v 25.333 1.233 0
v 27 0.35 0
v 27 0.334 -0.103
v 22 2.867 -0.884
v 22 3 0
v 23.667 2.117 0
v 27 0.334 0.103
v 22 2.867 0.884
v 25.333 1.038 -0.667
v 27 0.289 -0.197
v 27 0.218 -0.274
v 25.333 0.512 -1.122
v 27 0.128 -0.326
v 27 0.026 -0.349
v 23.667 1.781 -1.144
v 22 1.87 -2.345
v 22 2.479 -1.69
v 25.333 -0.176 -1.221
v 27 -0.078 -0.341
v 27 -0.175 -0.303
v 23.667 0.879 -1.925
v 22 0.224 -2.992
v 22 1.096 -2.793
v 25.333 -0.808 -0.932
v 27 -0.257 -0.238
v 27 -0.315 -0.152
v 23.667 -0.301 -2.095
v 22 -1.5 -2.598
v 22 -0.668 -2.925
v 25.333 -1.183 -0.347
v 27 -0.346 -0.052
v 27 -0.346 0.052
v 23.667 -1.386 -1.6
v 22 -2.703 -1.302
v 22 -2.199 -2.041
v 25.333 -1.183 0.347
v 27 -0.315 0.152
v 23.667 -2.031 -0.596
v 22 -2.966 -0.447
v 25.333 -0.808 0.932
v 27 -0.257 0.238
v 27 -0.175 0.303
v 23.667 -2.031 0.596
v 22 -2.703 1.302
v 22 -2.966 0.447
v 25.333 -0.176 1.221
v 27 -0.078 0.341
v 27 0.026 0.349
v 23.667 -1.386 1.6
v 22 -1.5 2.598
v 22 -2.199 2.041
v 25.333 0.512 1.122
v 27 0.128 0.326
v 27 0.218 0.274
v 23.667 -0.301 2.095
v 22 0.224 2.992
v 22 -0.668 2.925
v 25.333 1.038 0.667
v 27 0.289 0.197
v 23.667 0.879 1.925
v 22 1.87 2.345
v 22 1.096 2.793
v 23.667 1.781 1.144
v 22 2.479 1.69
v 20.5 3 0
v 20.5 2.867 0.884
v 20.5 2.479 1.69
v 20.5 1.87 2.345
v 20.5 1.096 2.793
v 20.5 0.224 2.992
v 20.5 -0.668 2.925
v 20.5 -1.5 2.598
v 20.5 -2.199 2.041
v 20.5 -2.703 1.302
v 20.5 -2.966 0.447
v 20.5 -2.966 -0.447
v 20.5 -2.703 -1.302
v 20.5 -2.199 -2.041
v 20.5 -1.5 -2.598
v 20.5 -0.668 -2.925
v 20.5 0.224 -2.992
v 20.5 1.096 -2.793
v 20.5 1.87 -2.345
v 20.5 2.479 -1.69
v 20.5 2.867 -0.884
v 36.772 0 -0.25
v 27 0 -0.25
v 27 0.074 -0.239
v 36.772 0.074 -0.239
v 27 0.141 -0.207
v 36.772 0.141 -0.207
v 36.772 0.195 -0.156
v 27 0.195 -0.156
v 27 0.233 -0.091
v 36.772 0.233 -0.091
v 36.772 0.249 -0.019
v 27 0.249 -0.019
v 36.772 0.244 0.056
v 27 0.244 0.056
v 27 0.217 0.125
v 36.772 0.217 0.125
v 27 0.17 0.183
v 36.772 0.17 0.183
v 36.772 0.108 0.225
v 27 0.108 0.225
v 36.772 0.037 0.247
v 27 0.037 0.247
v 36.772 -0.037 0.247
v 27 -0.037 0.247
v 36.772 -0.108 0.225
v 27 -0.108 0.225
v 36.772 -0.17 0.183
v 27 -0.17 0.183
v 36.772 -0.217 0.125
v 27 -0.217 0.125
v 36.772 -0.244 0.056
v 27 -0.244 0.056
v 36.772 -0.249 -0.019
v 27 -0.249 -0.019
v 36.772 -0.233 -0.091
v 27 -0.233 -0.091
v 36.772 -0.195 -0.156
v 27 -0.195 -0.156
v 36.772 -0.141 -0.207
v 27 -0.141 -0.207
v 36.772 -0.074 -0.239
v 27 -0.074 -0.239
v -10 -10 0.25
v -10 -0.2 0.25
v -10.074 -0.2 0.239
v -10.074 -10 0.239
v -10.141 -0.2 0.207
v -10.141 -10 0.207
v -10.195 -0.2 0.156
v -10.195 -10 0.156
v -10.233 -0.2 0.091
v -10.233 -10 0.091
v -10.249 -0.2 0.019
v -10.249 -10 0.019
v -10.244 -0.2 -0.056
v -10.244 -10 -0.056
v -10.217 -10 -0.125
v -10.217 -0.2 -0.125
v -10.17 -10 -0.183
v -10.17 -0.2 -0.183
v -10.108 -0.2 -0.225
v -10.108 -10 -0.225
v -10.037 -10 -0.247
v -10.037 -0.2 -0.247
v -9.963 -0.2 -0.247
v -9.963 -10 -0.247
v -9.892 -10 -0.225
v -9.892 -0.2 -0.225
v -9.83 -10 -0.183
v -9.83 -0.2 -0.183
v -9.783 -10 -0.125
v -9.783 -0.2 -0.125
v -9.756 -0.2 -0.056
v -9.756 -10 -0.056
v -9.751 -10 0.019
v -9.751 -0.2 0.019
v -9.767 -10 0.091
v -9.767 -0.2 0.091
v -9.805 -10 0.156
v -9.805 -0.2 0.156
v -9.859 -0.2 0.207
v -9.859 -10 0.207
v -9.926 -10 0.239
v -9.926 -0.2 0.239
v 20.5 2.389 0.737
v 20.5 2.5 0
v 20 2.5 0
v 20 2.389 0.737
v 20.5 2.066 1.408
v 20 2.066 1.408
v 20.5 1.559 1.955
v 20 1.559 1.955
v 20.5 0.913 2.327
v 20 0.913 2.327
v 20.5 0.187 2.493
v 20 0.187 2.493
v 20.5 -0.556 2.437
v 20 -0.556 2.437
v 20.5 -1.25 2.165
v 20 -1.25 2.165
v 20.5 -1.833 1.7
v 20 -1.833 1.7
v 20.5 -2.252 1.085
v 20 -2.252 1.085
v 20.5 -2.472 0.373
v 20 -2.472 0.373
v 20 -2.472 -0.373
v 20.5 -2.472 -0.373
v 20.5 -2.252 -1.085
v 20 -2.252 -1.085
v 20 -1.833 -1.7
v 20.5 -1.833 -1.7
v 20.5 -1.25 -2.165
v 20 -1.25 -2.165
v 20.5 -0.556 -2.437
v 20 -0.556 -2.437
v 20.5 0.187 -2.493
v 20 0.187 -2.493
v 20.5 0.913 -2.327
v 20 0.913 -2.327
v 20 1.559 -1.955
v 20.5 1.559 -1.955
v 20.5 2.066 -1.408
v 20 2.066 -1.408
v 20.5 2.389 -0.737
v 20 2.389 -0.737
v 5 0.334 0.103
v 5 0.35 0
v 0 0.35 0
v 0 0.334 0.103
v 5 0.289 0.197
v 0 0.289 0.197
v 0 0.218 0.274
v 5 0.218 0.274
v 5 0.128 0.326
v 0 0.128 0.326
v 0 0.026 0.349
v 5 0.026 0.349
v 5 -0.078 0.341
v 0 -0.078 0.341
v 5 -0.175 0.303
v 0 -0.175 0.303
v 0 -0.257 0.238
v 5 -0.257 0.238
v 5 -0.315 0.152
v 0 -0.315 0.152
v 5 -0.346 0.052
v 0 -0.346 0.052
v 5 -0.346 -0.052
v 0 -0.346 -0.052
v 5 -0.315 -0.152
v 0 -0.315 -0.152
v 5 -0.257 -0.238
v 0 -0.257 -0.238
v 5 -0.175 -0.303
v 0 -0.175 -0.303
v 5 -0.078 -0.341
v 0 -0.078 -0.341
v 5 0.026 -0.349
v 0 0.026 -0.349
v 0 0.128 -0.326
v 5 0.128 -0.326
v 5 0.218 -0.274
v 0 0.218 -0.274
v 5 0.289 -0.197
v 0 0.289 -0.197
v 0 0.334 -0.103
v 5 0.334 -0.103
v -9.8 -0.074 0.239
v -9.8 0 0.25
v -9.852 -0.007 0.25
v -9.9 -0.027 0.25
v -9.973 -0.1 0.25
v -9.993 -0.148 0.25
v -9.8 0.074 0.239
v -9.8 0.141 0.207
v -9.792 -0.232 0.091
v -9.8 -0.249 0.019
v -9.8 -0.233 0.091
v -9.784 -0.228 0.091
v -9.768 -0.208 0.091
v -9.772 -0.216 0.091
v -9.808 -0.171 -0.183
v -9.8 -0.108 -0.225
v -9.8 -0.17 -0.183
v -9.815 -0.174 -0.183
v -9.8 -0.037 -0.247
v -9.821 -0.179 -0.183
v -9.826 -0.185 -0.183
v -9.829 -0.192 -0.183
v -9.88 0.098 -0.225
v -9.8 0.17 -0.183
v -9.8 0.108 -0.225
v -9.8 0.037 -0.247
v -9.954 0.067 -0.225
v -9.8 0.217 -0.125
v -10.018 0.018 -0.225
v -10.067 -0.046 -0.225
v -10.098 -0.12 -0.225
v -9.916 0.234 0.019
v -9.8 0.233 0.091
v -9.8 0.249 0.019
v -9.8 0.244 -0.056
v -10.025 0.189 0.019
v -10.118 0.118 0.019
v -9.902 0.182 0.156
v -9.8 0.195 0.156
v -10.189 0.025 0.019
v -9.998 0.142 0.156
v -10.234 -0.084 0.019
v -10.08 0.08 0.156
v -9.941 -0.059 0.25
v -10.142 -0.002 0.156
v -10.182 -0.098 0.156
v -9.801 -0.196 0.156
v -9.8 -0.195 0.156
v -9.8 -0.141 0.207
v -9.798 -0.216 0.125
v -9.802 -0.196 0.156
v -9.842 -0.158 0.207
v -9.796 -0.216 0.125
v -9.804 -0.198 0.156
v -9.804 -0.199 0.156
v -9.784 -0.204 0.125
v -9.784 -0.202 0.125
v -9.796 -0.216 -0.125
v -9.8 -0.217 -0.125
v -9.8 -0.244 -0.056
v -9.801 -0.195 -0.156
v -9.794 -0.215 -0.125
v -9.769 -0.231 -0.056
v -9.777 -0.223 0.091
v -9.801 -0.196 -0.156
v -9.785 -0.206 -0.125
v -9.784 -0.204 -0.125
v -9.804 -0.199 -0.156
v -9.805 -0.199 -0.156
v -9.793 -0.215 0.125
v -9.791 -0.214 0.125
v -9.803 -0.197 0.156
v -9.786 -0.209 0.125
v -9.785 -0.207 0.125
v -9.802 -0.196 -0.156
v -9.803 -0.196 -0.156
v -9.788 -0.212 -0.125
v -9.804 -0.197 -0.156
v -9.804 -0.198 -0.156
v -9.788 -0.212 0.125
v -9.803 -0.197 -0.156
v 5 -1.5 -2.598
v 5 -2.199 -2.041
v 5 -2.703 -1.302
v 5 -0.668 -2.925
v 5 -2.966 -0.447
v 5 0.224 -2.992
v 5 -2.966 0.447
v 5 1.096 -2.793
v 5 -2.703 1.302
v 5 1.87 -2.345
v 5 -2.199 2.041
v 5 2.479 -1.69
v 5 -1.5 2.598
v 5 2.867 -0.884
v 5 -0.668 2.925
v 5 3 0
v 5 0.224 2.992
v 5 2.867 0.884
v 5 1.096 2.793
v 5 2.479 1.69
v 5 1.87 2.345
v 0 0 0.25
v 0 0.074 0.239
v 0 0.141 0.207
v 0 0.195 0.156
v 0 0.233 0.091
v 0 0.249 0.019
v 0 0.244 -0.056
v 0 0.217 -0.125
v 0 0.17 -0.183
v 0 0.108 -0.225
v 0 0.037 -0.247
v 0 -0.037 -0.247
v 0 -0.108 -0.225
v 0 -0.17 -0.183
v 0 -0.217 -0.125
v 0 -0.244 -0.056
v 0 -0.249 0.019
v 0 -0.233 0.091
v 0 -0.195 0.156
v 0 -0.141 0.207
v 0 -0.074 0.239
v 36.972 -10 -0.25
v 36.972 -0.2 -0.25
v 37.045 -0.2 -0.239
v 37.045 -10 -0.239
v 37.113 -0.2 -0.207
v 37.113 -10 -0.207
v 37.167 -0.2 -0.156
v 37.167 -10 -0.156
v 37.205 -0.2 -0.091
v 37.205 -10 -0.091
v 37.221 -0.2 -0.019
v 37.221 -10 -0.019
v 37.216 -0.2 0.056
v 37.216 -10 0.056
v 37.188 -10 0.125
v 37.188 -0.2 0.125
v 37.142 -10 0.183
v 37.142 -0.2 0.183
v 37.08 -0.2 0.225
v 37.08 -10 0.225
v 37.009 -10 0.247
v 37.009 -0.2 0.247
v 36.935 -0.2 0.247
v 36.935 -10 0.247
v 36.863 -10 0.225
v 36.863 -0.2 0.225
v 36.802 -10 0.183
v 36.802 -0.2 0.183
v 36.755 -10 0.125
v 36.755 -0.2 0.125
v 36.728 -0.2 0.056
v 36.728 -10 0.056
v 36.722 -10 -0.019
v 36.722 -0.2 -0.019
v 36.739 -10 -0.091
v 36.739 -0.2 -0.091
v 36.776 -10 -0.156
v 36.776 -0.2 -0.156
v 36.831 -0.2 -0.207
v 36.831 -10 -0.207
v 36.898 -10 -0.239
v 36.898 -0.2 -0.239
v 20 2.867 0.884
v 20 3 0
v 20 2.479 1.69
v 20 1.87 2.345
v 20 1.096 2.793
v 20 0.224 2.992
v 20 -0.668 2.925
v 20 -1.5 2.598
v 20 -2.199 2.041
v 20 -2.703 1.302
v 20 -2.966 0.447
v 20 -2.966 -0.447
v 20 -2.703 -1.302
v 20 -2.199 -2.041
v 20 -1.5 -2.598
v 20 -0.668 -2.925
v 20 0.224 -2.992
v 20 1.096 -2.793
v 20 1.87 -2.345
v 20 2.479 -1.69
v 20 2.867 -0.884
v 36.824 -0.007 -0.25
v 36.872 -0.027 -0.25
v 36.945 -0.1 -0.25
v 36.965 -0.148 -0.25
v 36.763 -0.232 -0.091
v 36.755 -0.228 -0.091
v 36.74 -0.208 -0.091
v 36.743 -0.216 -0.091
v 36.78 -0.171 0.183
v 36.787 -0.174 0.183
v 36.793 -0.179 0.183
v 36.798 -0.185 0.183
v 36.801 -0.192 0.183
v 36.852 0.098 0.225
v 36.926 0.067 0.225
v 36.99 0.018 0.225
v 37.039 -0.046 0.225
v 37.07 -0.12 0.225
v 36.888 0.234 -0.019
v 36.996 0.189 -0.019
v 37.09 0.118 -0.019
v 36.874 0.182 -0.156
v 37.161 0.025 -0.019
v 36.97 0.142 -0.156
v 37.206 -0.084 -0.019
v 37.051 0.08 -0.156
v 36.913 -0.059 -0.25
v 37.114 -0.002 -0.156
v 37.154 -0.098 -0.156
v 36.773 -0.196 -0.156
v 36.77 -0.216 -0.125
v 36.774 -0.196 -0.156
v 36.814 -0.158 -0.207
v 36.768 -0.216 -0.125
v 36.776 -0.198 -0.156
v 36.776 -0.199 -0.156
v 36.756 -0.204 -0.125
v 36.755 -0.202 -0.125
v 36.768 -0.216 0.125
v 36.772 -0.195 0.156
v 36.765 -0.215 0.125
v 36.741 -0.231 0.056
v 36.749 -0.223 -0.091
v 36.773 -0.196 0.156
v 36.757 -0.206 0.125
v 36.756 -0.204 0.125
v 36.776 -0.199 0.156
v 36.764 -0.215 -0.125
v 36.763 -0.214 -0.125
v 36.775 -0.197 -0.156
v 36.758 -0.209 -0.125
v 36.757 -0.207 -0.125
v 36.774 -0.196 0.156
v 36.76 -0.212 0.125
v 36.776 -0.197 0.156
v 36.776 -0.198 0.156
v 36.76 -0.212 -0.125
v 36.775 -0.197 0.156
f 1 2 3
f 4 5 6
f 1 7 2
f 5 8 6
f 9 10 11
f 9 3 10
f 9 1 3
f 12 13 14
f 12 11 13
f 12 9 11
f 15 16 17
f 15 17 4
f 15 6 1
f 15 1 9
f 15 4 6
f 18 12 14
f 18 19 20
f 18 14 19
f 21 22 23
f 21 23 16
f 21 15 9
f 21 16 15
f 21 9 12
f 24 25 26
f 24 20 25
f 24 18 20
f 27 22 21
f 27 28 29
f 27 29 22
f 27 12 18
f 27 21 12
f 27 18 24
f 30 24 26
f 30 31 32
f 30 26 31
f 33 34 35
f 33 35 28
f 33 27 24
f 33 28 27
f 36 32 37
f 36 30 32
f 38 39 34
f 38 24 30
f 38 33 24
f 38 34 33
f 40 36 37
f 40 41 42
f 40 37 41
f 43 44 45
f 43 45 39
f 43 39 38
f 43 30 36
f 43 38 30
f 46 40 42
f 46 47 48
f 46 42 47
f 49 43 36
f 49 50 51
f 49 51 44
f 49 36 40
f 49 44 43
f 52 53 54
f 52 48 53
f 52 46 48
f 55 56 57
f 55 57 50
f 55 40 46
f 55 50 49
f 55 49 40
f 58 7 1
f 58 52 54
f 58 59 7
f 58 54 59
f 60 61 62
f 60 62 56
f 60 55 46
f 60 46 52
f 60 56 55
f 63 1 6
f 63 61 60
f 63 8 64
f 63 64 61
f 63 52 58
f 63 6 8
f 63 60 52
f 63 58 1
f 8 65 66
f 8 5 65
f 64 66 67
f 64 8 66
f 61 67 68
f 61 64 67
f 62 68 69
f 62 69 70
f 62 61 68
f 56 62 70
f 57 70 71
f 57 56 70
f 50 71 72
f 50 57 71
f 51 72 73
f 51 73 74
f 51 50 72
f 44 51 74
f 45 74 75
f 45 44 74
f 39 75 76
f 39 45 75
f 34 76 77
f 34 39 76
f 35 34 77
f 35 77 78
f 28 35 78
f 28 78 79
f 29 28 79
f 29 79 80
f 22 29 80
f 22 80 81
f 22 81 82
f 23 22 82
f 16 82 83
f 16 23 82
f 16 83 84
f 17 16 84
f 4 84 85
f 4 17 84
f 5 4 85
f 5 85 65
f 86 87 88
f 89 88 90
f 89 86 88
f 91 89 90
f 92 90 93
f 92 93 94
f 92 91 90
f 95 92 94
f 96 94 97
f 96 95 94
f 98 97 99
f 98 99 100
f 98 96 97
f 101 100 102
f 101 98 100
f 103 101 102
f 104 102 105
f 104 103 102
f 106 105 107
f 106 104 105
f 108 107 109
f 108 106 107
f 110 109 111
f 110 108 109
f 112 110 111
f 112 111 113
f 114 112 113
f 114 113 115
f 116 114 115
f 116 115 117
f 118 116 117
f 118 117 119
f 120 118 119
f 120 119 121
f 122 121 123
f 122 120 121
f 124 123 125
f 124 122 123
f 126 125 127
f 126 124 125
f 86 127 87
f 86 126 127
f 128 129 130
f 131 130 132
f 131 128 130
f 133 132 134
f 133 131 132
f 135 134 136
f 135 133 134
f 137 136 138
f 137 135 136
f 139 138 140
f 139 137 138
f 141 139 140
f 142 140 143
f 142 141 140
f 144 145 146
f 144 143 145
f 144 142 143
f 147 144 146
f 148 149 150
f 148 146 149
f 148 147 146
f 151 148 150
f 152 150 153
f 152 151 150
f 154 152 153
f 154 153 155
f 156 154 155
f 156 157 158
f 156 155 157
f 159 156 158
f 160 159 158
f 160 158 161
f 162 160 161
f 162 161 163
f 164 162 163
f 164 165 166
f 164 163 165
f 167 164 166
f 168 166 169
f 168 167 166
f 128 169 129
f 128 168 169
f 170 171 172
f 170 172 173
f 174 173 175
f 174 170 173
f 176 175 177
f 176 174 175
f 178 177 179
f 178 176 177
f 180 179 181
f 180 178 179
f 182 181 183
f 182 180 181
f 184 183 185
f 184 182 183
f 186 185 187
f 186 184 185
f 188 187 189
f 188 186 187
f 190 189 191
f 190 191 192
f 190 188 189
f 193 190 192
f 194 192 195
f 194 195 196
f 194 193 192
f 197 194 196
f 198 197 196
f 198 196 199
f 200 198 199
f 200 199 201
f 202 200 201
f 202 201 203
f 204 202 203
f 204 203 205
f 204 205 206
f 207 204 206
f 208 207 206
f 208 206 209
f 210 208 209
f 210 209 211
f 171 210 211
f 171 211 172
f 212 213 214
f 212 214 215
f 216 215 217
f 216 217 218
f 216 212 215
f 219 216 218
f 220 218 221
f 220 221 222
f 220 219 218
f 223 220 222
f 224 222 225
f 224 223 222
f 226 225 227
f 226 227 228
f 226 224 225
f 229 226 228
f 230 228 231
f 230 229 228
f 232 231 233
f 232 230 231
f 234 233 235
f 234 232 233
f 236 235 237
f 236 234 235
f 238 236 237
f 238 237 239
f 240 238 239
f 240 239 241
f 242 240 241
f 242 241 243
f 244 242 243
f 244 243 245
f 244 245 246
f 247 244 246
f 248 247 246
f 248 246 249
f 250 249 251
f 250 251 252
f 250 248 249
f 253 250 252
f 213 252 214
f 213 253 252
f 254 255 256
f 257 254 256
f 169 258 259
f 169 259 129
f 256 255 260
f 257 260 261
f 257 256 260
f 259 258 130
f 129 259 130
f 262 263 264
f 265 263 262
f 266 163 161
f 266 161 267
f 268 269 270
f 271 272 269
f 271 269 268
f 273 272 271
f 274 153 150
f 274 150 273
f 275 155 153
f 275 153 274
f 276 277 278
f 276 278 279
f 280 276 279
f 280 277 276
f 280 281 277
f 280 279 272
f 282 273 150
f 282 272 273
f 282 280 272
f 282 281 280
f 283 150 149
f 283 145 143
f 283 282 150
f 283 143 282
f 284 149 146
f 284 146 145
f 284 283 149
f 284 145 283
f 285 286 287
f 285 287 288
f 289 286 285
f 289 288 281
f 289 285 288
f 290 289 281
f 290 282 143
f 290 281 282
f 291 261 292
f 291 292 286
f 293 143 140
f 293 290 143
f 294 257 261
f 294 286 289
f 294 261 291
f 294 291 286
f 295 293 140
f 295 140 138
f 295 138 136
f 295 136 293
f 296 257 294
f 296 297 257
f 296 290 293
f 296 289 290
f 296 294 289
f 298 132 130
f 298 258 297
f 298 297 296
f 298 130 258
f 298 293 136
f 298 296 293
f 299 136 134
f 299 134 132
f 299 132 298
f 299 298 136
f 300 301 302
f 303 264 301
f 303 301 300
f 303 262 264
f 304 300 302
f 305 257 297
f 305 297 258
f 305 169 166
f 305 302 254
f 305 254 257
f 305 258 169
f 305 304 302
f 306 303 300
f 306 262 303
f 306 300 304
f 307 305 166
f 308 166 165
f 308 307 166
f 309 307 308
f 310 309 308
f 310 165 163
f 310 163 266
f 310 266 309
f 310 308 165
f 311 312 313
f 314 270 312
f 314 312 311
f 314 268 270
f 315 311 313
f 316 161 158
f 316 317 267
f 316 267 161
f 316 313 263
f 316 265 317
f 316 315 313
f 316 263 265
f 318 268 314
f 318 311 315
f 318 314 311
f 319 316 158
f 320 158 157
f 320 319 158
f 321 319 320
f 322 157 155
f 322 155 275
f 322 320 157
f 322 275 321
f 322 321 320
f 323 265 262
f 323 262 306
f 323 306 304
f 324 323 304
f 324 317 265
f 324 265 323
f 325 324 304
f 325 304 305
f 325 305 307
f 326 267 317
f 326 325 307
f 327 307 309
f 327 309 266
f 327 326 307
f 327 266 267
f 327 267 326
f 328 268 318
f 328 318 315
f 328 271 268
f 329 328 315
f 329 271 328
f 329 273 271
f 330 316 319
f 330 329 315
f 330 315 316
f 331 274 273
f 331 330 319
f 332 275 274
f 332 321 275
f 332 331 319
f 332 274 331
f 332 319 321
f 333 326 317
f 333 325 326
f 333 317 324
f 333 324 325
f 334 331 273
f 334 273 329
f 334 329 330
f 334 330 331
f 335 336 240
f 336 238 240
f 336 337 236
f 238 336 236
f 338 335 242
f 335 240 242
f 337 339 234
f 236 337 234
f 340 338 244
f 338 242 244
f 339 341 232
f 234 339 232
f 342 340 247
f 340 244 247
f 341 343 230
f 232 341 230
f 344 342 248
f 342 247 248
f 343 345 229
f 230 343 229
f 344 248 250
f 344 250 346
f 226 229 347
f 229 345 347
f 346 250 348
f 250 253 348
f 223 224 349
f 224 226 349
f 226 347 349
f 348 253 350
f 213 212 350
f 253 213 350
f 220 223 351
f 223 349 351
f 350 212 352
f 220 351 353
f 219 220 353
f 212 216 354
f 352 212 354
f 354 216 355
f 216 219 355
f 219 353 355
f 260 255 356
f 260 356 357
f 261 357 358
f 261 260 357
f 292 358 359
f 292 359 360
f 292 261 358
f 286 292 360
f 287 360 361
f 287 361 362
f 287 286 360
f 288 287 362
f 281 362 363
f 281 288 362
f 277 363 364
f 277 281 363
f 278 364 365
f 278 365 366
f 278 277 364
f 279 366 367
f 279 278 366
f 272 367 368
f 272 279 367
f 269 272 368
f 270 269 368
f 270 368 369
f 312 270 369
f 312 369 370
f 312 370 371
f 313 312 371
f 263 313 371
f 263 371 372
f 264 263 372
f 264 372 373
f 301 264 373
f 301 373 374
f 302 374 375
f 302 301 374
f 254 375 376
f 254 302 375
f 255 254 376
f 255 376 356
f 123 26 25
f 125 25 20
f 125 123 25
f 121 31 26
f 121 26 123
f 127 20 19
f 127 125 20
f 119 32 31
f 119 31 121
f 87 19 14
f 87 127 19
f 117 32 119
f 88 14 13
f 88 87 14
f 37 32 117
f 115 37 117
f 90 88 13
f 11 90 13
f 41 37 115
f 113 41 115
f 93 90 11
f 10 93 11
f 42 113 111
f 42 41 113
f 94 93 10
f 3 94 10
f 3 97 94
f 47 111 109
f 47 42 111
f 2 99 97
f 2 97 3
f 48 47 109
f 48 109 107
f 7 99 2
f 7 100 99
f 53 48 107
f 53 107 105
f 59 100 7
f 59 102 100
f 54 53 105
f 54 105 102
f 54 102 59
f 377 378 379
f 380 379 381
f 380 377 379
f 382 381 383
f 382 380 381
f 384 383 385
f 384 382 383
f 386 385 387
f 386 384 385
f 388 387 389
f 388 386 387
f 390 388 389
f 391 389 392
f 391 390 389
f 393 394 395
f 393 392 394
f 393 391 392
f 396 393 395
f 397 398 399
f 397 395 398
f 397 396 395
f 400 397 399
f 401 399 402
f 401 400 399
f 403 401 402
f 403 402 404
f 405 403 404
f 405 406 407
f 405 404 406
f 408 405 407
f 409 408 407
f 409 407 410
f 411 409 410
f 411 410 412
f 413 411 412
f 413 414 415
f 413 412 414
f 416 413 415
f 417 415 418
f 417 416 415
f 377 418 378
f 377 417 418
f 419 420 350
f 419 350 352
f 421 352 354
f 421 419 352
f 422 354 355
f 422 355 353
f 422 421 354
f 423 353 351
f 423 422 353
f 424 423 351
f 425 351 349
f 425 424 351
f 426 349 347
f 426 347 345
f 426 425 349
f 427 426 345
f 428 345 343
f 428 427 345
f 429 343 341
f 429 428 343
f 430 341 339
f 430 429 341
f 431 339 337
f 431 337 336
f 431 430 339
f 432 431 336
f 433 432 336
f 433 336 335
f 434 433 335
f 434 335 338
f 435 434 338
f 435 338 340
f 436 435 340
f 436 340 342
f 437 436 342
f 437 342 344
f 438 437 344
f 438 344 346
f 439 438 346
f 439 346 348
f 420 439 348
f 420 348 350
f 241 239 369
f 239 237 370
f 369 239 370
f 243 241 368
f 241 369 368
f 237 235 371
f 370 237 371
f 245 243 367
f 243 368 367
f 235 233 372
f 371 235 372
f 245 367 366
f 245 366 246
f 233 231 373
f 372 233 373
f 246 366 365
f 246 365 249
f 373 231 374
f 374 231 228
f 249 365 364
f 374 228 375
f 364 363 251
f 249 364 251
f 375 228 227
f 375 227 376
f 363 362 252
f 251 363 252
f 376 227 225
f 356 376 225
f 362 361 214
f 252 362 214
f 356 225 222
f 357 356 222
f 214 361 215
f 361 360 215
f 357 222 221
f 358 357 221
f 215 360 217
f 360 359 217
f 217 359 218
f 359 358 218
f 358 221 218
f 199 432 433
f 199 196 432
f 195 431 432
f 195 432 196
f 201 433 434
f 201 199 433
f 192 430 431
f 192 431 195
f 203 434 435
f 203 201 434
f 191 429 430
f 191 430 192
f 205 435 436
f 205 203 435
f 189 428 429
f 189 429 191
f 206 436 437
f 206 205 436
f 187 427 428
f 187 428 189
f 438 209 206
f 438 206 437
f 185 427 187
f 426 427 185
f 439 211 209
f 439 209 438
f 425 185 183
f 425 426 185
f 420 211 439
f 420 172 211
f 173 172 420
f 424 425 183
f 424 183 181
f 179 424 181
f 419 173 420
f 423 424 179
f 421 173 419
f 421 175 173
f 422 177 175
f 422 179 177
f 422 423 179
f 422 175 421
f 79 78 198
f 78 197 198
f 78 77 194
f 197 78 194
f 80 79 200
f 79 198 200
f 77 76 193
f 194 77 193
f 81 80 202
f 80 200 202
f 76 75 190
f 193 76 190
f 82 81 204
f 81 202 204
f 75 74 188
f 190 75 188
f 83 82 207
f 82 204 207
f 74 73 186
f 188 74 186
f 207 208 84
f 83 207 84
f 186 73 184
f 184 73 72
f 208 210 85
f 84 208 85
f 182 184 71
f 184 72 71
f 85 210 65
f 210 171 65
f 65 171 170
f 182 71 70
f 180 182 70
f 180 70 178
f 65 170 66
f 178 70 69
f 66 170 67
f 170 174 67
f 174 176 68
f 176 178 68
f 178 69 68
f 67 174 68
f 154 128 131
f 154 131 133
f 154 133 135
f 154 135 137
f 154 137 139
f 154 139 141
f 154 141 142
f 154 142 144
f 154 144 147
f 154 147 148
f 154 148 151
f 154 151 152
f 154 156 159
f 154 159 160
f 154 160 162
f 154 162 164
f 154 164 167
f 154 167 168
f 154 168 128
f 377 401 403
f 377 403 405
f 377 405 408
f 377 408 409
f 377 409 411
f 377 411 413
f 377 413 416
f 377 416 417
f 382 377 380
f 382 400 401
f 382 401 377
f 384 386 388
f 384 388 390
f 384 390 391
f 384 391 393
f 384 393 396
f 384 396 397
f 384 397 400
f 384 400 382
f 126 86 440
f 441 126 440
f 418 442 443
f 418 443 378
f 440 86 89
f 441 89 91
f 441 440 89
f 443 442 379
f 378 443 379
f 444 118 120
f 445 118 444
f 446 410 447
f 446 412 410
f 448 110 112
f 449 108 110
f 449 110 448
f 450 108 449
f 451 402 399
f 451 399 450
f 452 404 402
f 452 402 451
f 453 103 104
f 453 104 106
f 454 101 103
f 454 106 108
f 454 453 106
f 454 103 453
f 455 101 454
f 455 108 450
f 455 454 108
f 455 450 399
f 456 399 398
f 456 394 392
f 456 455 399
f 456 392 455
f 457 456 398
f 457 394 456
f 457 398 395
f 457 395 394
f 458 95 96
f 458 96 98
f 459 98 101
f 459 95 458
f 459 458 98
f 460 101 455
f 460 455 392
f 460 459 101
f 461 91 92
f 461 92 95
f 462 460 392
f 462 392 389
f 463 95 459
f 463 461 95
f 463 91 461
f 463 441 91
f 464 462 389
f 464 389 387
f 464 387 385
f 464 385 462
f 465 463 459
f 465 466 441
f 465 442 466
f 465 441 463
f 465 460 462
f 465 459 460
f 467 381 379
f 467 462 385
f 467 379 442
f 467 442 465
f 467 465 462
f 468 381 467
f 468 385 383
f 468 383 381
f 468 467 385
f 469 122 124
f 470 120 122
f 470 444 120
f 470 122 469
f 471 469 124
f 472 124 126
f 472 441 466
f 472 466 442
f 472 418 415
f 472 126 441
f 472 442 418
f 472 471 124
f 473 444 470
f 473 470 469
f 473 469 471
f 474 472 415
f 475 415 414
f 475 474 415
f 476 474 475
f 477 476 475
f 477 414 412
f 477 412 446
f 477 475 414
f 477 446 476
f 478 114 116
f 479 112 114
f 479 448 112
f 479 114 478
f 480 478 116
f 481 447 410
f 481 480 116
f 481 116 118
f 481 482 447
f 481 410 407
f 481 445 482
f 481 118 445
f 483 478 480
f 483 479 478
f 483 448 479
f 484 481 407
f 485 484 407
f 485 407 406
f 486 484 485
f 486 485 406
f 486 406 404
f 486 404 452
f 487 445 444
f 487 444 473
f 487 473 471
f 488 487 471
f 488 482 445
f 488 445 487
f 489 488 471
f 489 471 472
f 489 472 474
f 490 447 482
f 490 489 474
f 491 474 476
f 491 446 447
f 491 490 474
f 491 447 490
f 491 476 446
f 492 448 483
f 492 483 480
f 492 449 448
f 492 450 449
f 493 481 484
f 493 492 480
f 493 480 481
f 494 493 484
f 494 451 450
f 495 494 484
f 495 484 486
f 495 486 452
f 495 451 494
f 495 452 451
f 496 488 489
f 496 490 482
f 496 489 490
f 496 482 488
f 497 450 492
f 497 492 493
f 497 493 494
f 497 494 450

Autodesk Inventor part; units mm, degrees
ref_plane "YZ Plane" through (0, 0, 0) normal (1, 0, 0) x (0, 1, 0)
ref_plane "XZ Plane" through (0, 0, 0) normal (0, 1, 0) x (-1, 0, 0)
ref_plane "XY Plane" through (0, 0, 0) normal (0, 0, 1) x (1, 0, 0)
sketch "Sketch1" plane through (0, 0, 0) normal (0, 0, 1) x (1, 0, 0)
  line L0 (0, 0) -> (0, 0.35)
  line L1 (0, 0.35) -> (5, 0.35)
  line L2 (5, 0.35) -> (5, 3)
  line L3 (5, 3) -> (20, 3)
  line L4 (20, 3) -> (20, 2.5)
  line L5 (20, 2.5) -> (20.5, 2.5)
  line L6 (20.5, 2.5) -> (20.5, 3)
  line L7 (20.5, 3) -> (22, 3)
  line L8 (0, 0) -> (27, 0)
  line L9 (27, 0) -> (27, 0.35)
  line L10 (27, 0.35) -> (22, 3)
  dimension "d0" = 0.35
  dimension "d1" = 5
  dimension "d2" = 2.65
  dimension "d3" = 15
  dimension "d4" = 0.5
  dimension "d5" = 0.5
  dimension "d6" = 0.5
  dimension "d7" = 1.5
  dimension "d8" = 27
  dimension "d9" = 0.35
revolve "Revolution1" add sketch "Sketch1" angle 360 about axis through (0, 0, 0) along (1, 0, 0)
ref_plane "Work Plane1" through (27, 0, 0) normal (1, 0, 0) x (0, 0, -1)
sketch "Sketch2" plane through (27, 0, 0) normal (1, 0, 0) x (0, 0, -1)
  circle A0 centre (0, 0) radius 0.25
  dimension "d12" = 0.5
ref_plane "Work Plane2" through (0, 0, 0) normal (-1, 0, 0) x (0, 0, 1)
sketch "Sketch3" plane through (0, 0, 0) normal (-1, 0, 0) x (0, 0, 1)
  circle A0 centre (0, 0) radius 0.25
  dimension "d14" = 0.5
sketch "Sketch4" plane through (0, 0, 0) normal (0, 0, 1) x (1, 0, 0)
  line L0 (0, 0) -> (-9.8, 0)
  line L1 (-10, -0.2) -> (-10, -10)
  line L2 (26.9718, 0) -> (36.7718, 0)
  line L3 (36.9718, -0.2) -> (36.9718, -10)
  arc A0 (-9.8, 0) -> (-10, -0.2) centre (-9.8, -0.2) ccw
  arc A1 (36.9718, -0.2) -> (36.7718, 0) centre (36.7718, -0.2) ccw
  point P0 (-10, 0)
  point P1 (36.9718, 0)
  dimension "d15" = 10
  dimension "d16" = 10
  dimension "d17" = 10
  dimension "d18" = 10
  dimension "d19" = 0.2
sweep "Sweep1" add profiles "Sketch2" path "Sketch4" path curves L2 A1 L3
sweep "Sweep2" add profiles "Sketch3" path "Sketch4" path curves L0 A0 L1
equation "\"BendRadius\" = Thickness"
equation "\"BendReliefWidth\" = Thickness"
equation "\"BendReliefDepth\" = 0.5 * Thickness"
equation "\"CornerReliefSize\" = 4 * Thickness"
equation "\"MinimumRemnant\" = 2 * Thickness"
equation "\"TransitionRadius\" = BendRadius"
equation "\"JacobiRadiusSize\" = BendRadius"
equation "\"GapSize\" = Thickness"
equation "\"Thickness\" = 3.048"
properties part number "k50-29"
